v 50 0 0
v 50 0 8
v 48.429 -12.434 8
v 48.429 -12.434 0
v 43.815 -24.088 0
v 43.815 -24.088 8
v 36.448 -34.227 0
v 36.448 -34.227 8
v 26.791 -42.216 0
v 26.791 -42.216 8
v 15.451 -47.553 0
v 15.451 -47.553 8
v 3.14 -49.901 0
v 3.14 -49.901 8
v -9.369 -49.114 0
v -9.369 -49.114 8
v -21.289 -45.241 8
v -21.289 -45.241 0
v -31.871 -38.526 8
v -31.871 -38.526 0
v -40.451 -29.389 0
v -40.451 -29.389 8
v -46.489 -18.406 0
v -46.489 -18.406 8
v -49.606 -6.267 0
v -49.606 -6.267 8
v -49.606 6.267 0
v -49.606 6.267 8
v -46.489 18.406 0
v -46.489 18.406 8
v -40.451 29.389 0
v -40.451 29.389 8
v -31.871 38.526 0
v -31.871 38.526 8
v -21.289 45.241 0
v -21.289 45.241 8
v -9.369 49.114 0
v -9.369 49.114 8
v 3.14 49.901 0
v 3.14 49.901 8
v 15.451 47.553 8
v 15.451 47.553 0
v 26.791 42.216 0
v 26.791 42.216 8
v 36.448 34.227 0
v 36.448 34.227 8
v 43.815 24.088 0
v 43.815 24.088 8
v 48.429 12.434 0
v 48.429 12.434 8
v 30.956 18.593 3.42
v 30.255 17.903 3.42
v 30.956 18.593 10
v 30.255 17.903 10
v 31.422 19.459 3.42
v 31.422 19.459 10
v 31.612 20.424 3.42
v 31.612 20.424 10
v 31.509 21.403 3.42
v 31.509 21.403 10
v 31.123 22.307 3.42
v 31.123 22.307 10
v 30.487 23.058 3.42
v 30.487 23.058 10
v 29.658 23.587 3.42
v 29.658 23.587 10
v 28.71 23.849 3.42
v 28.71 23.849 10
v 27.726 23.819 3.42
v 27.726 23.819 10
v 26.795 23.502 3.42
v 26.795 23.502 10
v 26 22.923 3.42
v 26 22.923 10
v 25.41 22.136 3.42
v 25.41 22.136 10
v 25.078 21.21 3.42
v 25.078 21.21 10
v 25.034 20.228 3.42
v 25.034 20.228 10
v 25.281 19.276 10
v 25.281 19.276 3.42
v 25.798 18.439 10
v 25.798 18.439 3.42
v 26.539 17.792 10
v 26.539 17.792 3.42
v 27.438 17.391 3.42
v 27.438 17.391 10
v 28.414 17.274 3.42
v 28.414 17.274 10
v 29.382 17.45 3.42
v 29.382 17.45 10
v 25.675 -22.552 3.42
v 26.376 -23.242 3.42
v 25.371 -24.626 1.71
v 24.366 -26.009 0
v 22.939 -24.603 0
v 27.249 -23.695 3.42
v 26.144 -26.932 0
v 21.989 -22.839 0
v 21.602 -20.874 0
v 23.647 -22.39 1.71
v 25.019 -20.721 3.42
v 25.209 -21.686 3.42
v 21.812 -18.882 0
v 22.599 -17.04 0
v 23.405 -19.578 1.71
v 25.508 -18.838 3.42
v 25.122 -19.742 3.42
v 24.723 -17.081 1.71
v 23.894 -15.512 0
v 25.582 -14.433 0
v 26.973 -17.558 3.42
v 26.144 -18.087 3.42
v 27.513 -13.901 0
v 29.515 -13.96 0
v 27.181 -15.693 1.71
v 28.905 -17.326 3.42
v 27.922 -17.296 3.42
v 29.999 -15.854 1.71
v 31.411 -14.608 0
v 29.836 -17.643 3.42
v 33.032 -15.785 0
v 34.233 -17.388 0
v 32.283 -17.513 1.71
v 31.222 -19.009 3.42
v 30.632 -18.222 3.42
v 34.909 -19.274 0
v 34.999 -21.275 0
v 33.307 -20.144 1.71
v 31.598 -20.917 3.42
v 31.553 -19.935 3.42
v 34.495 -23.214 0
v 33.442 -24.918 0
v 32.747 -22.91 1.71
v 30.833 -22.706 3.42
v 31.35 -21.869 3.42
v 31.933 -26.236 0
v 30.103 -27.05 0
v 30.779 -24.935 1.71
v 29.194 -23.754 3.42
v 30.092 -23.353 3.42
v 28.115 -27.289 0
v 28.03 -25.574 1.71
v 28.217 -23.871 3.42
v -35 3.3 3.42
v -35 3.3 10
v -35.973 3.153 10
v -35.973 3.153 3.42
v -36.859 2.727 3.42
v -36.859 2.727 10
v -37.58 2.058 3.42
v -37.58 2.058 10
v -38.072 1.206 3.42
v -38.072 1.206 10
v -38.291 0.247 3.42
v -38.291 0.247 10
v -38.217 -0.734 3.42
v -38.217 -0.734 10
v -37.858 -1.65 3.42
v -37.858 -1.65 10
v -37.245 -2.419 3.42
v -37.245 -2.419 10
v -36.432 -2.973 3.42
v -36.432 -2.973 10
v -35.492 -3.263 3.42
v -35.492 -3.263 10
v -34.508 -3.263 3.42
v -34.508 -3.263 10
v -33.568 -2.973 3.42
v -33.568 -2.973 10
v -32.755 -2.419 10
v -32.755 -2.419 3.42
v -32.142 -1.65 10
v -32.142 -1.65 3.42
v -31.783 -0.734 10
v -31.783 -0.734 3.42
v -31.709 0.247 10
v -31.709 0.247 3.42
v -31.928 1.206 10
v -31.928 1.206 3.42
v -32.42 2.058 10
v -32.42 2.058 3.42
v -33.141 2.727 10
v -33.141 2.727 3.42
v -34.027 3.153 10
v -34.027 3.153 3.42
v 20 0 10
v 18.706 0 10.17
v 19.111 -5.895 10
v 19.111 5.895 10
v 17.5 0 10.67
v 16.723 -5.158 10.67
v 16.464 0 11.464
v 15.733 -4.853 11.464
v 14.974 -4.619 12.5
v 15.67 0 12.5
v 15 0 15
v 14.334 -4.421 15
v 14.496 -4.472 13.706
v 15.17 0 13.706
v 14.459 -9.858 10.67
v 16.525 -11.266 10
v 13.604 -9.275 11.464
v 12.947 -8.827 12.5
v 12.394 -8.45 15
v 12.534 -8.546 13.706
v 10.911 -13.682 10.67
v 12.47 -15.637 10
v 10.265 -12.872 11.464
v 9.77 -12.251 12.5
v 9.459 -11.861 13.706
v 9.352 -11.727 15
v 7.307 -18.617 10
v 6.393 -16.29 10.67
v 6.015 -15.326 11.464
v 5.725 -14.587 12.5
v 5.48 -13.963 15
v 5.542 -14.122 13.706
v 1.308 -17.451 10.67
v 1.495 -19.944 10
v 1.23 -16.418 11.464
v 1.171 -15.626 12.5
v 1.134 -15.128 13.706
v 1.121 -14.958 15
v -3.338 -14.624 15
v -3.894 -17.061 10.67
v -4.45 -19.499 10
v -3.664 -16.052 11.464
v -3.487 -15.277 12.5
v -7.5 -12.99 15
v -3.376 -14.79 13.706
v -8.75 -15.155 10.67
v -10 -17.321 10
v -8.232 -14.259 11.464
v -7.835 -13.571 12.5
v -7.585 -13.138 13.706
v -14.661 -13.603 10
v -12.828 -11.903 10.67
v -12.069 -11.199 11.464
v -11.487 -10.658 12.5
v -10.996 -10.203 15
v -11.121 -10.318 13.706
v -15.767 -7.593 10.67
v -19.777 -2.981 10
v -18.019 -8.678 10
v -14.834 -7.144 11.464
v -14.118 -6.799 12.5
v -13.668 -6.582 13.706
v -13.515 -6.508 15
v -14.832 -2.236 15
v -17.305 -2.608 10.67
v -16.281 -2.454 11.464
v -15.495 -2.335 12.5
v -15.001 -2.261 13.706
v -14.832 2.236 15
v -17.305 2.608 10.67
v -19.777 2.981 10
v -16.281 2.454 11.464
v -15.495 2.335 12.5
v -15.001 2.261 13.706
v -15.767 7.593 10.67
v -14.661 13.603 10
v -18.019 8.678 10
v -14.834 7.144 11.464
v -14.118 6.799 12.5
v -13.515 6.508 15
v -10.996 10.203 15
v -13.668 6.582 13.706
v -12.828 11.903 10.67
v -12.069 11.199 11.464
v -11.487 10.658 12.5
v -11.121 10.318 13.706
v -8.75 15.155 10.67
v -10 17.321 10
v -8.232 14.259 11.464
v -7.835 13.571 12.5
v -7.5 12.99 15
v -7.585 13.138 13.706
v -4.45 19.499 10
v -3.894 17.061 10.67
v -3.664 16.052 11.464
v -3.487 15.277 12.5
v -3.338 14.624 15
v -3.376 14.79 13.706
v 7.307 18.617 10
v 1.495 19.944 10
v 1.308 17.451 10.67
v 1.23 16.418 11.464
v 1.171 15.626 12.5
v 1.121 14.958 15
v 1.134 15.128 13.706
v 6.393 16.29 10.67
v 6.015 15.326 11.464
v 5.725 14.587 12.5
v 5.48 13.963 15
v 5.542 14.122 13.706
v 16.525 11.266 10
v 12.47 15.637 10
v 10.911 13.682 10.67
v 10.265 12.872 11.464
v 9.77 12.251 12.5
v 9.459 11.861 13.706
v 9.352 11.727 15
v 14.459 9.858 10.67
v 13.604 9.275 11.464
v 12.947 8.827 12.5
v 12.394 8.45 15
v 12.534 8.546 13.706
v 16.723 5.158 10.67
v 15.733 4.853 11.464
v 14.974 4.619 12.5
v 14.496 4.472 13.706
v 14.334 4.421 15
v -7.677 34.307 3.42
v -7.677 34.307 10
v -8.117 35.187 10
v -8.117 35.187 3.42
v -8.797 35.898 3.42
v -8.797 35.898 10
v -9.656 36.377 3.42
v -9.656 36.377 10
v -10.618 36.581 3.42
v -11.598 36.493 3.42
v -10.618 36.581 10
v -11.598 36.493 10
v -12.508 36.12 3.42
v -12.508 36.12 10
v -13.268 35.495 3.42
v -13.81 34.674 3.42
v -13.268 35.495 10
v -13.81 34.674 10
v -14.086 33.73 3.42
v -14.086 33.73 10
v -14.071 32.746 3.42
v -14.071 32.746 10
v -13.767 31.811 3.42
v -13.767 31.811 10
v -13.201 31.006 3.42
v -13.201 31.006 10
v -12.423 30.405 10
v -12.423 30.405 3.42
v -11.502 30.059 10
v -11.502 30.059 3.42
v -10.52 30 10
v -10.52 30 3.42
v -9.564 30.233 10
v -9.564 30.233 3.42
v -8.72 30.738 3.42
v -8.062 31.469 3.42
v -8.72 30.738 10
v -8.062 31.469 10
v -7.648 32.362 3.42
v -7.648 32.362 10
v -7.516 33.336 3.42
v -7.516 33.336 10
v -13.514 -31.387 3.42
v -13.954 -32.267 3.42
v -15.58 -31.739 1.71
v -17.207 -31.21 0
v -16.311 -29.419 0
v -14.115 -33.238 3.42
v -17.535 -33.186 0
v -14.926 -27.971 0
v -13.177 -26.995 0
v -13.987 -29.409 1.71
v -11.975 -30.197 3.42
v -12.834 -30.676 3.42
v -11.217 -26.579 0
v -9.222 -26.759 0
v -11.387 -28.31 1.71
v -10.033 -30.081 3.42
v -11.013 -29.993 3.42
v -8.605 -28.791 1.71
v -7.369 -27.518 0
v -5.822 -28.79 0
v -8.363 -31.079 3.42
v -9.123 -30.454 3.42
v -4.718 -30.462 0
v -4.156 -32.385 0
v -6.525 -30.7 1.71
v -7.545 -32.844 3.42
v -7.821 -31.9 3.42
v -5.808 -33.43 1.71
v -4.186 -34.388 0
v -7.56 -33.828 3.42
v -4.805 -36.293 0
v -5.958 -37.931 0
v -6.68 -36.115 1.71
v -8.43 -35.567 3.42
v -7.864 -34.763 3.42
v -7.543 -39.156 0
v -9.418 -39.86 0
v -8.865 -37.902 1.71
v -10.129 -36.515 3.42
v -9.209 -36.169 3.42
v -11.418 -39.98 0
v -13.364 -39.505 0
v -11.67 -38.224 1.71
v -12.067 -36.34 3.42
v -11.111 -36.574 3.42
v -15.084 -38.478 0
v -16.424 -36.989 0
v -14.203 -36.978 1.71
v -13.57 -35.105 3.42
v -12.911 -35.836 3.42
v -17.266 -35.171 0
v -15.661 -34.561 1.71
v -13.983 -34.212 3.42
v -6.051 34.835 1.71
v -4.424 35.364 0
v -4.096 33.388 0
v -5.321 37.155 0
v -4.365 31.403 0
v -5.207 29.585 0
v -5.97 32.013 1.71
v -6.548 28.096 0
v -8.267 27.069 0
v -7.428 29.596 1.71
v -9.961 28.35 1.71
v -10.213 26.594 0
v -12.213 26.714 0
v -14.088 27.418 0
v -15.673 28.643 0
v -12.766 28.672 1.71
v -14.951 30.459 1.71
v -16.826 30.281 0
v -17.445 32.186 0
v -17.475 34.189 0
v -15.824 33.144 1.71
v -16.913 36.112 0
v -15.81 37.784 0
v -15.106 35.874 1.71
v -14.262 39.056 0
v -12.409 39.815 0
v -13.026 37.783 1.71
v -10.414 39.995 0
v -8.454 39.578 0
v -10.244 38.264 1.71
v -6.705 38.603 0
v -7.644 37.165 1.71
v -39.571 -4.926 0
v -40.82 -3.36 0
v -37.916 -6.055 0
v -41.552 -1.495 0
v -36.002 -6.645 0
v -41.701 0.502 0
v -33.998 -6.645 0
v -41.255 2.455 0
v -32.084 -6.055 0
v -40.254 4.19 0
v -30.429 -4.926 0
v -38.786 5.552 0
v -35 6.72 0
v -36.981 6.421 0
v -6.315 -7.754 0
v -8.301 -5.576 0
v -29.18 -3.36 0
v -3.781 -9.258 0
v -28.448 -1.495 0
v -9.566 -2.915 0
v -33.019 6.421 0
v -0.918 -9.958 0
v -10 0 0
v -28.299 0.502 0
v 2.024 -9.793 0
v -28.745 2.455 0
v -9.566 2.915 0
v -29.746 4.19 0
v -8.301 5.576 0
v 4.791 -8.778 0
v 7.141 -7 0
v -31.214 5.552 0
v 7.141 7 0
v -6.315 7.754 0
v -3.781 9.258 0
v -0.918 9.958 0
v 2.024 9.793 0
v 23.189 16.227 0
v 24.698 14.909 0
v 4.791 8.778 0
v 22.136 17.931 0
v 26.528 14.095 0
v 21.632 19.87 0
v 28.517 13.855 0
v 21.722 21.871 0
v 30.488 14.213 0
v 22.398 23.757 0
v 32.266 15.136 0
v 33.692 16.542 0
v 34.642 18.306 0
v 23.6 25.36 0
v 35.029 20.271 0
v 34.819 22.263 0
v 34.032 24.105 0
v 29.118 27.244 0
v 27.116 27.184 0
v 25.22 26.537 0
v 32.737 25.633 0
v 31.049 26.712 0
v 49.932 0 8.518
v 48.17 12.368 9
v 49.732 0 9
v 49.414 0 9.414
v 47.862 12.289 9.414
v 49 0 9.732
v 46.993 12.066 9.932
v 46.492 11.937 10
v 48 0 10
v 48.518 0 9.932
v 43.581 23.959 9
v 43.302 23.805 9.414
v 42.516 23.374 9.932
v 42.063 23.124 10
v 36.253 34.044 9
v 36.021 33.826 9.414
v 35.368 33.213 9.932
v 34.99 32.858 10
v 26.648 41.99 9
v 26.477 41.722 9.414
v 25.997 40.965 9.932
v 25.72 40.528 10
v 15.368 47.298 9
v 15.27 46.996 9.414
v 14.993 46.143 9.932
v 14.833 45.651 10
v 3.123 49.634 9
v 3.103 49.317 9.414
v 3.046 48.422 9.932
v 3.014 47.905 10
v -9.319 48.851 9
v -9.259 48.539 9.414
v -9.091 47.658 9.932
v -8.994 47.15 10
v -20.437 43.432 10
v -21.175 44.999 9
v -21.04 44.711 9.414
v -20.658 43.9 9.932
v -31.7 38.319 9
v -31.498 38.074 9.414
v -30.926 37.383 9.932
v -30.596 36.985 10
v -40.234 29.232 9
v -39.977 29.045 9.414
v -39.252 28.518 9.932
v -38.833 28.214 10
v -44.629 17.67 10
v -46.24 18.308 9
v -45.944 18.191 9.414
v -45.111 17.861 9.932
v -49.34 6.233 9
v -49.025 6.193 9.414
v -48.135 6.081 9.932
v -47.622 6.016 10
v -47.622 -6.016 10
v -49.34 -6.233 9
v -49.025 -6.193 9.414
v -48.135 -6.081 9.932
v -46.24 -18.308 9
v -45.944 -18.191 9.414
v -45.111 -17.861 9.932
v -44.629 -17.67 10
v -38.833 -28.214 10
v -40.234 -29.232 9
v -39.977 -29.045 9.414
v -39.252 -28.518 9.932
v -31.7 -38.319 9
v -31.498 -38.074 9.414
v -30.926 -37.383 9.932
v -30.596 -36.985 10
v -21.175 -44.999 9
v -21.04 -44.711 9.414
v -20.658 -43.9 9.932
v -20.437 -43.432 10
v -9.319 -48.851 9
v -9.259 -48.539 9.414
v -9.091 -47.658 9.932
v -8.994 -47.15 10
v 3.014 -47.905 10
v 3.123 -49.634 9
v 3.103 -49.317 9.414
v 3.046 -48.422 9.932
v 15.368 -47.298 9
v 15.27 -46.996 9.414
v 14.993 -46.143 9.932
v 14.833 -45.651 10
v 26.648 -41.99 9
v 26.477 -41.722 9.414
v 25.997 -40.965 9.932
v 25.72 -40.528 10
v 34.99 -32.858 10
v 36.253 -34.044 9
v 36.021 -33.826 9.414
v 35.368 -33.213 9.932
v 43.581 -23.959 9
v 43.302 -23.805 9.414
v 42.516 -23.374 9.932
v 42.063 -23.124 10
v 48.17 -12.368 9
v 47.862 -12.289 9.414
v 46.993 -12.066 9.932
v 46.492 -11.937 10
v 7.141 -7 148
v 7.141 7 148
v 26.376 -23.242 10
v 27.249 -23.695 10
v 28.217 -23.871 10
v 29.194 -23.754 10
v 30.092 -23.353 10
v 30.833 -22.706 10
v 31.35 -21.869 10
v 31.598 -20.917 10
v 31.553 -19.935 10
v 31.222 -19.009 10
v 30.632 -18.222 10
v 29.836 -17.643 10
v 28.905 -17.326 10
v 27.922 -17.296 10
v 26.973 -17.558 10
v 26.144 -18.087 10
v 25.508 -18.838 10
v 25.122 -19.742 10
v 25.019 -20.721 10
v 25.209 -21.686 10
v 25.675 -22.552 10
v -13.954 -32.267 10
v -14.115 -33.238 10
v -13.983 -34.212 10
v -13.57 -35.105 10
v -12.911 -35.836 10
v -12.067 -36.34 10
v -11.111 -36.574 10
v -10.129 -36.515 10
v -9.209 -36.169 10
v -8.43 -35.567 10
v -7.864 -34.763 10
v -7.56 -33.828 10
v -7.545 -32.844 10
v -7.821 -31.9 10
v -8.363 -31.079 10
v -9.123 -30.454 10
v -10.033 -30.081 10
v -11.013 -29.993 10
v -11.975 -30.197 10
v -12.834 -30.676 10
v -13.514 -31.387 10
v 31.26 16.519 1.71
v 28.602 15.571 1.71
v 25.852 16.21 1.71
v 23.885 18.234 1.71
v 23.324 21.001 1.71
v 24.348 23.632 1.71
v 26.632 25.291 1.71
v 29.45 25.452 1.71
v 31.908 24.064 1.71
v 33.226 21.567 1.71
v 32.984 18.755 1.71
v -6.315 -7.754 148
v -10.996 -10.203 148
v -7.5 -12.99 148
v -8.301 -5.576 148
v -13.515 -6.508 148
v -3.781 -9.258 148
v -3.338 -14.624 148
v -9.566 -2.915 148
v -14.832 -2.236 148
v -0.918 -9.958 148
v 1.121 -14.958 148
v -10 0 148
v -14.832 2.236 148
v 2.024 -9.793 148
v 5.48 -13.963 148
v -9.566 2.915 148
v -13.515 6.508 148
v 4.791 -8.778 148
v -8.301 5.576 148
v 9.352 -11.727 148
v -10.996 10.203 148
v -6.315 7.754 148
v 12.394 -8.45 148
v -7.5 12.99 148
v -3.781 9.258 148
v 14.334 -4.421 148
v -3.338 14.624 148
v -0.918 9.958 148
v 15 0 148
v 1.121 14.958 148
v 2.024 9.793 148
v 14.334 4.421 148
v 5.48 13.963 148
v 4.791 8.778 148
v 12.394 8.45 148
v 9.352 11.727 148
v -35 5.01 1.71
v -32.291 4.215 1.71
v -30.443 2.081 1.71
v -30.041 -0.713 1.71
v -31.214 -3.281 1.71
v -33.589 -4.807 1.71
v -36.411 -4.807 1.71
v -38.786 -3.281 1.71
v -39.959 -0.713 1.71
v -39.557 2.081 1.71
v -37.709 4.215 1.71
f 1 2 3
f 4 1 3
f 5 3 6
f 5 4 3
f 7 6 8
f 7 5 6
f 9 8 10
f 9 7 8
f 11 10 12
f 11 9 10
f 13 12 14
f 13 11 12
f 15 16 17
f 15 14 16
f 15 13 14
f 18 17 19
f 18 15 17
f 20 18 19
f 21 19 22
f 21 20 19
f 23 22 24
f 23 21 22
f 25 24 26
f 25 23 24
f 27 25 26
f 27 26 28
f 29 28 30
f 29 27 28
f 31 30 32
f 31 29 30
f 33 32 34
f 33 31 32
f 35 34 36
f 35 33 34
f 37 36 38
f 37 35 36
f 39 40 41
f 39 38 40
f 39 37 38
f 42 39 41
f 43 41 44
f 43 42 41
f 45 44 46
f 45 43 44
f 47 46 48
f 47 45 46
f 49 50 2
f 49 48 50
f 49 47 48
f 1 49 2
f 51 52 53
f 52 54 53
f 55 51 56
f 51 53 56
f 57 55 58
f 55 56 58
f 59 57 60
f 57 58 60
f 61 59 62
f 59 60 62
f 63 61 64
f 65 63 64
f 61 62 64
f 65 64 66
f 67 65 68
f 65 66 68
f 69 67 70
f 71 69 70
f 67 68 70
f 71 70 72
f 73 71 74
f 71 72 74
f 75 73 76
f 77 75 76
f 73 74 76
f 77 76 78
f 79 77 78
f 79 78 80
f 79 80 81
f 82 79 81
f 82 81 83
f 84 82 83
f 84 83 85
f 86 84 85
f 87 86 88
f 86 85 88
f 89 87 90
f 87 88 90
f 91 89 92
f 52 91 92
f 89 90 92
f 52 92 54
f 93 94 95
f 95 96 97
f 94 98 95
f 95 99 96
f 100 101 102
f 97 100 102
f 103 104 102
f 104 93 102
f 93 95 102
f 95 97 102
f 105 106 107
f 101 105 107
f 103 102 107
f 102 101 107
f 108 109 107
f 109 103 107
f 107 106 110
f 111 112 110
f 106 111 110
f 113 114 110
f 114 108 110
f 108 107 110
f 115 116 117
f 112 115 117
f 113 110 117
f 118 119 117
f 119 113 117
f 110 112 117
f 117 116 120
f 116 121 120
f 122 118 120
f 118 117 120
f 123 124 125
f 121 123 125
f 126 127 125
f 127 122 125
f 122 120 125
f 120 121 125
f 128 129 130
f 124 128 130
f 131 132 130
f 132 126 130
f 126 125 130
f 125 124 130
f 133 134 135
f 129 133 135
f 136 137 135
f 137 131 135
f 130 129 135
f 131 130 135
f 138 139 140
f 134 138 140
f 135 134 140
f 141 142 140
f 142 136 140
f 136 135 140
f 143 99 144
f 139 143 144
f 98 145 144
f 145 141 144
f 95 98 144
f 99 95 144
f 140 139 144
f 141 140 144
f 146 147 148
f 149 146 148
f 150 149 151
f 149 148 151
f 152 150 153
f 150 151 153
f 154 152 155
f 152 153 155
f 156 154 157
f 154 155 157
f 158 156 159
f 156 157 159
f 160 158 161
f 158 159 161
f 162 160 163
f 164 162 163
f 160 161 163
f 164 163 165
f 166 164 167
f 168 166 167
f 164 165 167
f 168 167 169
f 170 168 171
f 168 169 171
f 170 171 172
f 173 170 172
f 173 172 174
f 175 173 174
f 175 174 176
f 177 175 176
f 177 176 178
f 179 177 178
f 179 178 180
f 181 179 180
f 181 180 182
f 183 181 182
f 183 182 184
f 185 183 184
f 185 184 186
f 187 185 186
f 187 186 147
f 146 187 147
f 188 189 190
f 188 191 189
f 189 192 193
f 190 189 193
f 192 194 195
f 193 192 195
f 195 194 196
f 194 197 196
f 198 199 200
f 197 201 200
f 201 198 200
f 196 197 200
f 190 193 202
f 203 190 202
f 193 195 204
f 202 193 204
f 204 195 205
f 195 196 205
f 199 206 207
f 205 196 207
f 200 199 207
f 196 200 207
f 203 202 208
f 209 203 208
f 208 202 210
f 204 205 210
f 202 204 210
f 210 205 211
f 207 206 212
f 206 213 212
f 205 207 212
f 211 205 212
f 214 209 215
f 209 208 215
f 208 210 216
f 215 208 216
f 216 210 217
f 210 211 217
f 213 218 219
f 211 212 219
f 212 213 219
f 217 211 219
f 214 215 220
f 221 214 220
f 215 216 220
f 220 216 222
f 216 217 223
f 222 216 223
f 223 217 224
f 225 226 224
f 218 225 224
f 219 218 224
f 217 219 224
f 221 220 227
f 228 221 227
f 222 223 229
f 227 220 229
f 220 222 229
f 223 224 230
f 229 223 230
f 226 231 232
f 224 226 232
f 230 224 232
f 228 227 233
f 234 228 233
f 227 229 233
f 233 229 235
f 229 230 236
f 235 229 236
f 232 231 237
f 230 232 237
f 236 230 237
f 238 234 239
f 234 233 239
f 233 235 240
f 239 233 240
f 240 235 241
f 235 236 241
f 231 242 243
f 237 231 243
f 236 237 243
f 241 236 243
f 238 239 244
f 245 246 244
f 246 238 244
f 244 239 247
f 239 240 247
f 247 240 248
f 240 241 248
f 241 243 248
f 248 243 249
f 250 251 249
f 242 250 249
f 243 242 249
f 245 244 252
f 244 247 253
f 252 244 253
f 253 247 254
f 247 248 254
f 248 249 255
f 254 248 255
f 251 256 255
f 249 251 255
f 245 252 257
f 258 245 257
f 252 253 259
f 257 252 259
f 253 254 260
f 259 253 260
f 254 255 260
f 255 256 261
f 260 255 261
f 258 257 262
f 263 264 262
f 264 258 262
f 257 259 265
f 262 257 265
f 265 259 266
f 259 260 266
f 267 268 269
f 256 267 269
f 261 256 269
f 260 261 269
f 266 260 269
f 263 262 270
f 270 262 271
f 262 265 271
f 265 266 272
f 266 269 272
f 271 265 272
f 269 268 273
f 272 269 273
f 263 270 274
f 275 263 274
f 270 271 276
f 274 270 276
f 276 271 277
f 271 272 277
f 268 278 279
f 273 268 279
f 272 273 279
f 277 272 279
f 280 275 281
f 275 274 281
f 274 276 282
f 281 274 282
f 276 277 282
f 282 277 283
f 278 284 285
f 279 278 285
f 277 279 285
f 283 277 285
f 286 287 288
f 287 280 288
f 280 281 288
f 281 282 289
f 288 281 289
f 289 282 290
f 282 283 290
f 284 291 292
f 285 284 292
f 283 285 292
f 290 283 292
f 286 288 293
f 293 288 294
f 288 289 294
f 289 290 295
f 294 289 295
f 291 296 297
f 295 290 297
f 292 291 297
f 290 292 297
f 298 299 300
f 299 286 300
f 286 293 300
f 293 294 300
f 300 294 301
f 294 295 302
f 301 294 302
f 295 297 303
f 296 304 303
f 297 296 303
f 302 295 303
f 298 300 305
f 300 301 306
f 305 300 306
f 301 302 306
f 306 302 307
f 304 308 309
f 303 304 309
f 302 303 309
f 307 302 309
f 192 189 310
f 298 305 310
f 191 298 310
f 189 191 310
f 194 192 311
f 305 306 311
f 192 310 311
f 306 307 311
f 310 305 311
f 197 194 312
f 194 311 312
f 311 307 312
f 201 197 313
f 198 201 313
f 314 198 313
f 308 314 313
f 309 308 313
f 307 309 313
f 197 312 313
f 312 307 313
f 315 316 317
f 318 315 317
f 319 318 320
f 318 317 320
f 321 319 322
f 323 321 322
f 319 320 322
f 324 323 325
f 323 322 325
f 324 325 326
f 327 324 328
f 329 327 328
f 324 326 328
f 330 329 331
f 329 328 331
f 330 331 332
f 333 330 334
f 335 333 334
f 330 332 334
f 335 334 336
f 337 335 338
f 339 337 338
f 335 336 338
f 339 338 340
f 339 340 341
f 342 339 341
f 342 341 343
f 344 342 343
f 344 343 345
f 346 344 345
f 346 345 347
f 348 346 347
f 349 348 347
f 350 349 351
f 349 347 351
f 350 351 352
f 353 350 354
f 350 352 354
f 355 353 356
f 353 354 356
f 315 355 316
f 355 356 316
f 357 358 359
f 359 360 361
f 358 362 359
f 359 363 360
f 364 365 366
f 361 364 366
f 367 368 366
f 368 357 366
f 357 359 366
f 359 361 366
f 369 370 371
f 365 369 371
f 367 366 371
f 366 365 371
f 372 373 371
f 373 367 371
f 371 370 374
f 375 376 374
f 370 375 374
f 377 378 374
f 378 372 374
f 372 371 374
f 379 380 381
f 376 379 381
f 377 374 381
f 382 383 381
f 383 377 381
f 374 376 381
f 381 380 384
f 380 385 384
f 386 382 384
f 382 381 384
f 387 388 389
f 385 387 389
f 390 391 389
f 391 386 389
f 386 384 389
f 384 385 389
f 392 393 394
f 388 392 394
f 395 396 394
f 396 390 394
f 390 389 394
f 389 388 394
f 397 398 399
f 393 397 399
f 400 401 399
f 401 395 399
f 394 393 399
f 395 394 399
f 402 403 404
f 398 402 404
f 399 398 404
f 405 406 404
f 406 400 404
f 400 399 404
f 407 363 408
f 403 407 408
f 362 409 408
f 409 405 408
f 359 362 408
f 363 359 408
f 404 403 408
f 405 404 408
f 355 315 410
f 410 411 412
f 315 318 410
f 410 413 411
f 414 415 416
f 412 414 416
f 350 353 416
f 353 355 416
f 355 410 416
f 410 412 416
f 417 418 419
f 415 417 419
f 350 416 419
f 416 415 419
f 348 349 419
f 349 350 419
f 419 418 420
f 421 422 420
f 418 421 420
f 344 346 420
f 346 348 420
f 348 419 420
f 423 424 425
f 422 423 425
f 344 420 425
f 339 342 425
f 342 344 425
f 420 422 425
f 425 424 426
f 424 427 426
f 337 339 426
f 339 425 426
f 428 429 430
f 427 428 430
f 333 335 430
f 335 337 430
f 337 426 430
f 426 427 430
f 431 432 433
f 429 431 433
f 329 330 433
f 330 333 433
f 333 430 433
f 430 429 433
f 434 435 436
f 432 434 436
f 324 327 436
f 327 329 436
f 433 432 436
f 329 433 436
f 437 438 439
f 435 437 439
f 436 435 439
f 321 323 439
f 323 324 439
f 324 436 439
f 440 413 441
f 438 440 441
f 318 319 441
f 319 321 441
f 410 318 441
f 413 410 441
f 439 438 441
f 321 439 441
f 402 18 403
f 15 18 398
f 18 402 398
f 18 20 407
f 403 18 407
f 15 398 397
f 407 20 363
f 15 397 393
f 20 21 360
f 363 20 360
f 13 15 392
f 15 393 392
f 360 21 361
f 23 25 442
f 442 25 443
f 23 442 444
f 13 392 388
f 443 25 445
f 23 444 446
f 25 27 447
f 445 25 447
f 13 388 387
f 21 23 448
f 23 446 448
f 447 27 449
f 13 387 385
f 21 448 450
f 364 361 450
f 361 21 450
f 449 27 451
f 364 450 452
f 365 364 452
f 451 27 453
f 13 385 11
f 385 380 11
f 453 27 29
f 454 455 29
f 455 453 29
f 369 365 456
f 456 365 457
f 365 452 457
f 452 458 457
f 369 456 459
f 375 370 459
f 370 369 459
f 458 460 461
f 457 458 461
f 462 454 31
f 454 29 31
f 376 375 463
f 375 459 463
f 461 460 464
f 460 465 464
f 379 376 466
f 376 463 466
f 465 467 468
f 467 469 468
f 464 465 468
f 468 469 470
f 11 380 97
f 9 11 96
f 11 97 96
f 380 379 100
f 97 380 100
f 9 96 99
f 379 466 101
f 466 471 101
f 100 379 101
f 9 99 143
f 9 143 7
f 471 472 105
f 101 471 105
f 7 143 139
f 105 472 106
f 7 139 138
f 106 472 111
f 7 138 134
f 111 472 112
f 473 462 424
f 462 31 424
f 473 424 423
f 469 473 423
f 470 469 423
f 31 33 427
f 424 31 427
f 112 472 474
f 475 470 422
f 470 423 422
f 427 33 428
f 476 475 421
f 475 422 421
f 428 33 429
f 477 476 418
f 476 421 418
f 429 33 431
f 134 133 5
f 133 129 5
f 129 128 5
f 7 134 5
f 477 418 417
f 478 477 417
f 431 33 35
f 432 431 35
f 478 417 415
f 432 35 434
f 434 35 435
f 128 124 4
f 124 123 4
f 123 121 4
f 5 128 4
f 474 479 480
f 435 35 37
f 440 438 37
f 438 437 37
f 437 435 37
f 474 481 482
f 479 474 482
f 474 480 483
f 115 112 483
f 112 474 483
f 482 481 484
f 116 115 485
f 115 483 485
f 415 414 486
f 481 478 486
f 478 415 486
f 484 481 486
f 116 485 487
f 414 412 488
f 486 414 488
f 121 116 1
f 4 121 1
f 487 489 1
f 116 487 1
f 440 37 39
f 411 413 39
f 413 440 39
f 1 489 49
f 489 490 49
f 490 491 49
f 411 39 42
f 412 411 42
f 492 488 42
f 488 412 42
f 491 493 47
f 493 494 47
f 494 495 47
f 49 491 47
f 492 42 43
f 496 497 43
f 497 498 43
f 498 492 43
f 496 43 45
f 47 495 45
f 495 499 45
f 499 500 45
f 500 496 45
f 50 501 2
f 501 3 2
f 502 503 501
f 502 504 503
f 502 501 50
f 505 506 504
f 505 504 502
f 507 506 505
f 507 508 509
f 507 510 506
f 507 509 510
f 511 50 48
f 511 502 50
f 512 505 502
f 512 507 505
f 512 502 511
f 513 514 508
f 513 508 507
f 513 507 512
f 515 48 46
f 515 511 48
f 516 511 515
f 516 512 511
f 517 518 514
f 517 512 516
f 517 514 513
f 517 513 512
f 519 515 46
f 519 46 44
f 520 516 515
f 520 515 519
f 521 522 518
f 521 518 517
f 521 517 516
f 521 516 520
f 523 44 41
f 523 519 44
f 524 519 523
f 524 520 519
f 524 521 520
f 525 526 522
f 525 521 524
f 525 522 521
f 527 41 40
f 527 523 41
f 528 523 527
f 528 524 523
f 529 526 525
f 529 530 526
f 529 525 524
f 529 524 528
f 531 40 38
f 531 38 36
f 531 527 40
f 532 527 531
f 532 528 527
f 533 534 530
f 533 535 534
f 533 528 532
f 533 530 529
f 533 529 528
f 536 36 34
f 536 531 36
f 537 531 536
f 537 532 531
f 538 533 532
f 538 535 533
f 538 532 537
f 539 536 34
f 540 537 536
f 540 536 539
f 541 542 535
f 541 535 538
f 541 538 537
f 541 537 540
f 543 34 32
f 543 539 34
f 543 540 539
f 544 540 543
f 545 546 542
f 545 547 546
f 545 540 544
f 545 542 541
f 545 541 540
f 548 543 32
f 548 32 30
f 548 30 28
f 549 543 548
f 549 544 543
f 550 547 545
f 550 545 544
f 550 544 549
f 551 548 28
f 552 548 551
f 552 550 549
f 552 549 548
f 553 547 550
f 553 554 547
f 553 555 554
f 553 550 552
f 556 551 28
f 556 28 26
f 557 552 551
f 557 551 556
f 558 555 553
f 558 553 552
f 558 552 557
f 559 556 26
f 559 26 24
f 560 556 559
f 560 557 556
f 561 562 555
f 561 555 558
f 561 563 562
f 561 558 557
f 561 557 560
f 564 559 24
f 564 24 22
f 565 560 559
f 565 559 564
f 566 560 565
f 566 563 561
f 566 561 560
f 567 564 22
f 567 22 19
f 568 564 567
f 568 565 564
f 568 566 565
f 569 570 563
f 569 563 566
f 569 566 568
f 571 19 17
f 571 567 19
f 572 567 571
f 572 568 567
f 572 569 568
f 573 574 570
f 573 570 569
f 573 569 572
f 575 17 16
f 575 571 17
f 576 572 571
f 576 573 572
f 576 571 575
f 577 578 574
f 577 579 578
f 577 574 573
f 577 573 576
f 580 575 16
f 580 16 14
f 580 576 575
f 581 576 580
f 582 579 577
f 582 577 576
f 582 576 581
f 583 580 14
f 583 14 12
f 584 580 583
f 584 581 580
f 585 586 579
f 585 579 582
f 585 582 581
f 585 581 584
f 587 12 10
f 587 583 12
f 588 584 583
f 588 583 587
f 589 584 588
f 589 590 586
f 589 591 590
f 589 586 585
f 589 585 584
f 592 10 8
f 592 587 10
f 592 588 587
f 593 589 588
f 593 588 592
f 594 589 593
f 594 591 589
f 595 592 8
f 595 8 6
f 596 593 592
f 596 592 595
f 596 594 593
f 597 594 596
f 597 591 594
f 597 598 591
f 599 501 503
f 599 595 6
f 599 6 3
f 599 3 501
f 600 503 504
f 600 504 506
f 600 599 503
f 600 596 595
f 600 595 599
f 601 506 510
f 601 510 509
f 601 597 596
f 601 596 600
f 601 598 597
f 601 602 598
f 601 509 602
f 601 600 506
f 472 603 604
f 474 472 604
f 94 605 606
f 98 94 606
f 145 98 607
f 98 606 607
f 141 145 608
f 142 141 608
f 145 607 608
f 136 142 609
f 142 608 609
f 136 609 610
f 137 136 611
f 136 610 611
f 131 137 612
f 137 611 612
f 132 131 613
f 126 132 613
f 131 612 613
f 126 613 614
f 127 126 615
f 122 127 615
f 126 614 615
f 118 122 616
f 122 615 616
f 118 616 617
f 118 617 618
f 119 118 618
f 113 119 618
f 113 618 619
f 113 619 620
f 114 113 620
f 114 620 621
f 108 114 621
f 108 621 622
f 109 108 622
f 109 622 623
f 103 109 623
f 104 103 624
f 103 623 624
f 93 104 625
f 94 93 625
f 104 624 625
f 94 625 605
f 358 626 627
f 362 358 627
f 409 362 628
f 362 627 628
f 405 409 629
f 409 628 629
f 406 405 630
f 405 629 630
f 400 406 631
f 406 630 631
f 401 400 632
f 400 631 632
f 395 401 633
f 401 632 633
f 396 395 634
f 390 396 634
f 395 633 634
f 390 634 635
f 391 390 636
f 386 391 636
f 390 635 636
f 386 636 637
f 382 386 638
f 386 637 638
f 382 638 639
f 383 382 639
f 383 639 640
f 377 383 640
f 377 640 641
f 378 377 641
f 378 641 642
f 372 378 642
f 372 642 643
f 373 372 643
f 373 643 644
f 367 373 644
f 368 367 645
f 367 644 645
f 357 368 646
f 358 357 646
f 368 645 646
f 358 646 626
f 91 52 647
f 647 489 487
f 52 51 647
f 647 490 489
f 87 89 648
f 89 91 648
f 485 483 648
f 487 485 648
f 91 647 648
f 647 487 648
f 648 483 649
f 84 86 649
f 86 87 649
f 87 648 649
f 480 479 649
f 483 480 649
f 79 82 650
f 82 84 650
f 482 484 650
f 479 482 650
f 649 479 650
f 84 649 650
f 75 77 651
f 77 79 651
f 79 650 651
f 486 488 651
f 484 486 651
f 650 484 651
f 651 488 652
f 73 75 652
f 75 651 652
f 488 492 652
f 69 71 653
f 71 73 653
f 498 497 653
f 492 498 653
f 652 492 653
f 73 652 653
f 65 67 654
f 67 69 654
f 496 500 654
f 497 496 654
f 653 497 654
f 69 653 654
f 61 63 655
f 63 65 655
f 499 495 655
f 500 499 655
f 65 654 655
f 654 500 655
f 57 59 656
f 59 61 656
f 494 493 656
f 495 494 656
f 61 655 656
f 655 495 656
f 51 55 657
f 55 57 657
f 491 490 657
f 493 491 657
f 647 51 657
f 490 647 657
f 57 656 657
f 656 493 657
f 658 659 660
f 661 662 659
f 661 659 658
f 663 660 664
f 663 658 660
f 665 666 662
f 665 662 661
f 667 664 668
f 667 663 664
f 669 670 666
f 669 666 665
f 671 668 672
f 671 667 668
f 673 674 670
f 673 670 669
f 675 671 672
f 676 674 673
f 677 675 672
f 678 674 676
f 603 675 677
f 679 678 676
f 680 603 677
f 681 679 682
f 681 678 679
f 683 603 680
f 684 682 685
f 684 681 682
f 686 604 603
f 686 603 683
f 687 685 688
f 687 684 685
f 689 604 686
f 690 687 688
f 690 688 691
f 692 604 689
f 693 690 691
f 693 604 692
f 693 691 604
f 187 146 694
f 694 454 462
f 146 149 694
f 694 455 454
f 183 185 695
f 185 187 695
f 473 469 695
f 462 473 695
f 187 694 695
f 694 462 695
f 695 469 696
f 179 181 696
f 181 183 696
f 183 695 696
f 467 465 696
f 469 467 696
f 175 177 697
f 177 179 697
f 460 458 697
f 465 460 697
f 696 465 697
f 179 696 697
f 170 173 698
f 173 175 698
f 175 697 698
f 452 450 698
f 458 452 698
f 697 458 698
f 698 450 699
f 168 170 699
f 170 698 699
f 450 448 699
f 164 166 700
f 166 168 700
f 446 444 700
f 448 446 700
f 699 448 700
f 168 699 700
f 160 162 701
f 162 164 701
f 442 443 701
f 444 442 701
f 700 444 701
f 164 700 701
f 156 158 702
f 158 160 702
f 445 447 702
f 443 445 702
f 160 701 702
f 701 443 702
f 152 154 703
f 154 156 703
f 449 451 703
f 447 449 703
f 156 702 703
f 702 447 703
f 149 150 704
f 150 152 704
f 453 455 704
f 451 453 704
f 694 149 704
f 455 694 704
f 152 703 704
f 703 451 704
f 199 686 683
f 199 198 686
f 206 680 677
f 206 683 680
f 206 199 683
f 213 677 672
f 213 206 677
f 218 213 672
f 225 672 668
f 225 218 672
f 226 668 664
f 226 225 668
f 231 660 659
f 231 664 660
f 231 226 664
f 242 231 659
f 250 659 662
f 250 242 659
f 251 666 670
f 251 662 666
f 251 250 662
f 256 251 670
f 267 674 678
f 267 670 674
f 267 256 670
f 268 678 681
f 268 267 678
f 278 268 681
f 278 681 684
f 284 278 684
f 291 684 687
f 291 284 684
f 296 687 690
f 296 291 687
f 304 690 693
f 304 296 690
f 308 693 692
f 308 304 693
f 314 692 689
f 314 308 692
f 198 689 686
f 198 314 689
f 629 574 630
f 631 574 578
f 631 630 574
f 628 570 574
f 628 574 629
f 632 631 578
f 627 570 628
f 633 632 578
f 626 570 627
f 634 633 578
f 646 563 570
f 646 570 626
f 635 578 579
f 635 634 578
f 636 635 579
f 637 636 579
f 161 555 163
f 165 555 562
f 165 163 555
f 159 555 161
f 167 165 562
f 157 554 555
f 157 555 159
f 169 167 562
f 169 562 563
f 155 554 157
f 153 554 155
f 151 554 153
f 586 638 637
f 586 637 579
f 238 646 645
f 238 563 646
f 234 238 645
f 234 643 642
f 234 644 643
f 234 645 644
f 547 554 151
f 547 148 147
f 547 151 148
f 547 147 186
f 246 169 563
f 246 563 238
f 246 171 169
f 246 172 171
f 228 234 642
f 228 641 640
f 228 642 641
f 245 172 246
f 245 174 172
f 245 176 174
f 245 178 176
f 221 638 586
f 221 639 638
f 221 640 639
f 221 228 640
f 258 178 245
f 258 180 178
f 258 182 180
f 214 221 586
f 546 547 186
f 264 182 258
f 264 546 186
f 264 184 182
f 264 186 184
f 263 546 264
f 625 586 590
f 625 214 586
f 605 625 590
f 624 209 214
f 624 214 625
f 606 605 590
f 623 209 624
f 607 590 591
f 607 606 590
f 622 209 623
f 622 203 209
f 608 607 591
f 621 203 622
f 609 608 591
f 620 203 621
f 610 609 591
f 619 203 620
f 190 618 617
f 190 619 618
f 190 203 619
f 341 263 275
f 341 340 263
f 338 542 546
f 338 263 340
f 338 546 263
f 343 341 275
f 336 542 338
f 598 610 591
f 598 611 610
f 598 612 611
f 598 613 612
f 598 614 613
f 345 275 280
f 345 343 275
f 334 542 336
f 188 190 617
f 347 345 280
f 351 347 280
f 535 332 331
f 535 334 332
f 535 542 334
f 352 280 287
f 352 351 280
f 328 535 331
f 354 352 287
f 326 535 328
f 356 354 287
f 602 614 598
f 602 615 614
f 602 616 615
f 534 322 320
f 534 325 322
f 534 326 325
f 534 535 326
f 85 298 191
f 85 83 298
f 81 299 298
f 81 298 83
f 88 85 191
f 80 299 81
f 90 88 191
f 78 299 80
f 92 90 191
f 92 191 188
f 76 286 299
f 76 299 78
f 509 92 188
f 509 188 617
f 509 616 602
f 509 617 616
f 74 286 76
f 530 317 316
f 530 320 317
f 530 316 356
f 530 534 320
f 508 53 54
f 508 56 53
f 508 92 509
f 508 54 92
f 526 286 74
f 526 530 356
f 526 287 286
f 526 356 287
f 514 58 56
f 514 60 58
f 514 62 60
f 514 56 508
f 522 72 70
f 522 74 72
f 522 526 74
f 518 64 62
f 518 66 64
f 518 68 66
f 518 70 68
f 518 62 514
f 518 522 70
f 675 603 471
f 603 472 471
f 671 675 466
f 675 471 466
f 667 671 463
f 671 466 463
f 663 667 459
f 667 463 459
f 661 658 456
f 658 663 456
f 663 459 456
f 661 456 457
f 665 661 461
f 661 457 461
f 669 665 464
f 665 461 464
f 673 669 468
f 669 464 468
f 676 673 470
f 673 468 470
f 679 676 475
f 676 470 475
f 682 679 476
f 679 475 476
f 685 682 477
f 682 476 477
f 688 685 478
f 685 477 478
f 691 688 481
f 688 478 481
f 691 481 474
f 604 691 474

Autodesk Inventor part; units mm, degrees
ref_plane "YZ Plane" through (0, 0, 0) normal (1, 0, 0) x (0, 1, 0)
ref_plane "XZ Plane" through (0, 0, 0) normal (0, 1, 0) x (-1, 0, 0)
ref_plane "XY Plane" through (0, 0, 0) normal (0, 0, 1) x (1, 0, 0)
sketch "Sketch2" plane through (0, 0, 0) normal (0, 0, 1) x (1, 0, 0)
  circle A0 centre (0, 0) radius 50
  arc A1 (7.1414, 7) -> (7.1414, -7) centre (0, 0) ccw
  line L0 (7.1414, -7) -> (7.1414, 7)
  dimension "d2" = 100
  dimension "d3" = 20
  dimension "d23" = 14
extrude "Extrusion1" add sketch "Sketch2" along normal blind 10
sketch "Sketch3" plane through (0, 0, 10) normal (0, 0, 1) x (1, 0, 0)
  circle A0 centre (0, 0) radius 15
  line L0 (7.1414, 7) -> (7.1414, -7) projected
  arc A1 (7.1414, 7) -> (7.1414, -7) centre (0, 0) ccw projected
  circle A2 centre (0, 0) radius 50 projected
  dimension "d6" = 30
extrude "Extrusion2" add sketch "Sketch3" along normal blind 138 contours A0
fillet "Fillet1" radius 2 1 edges at (-50, 0, 10)
fillet "Fillet2" radius 5 1 edges at (-15, 0, 10)
sketch "Sketch4" plane through (0, 0, 0) normal (0, 0, -1) x (-1, 0, 0)
  circle A0 centre (35, 0) radius 6
  point P0 (0, 0)
  dimension "d11" = 35
  dimension "d12" = 12
hole "Hole1" at (-35, 0, 0) direction (0, 0, 1) diameter 6.6 end through all countersink diameter 13.44 countersink angle 90
pattern_circular "Circular Pattern1" count 5 over 360 about axis through (0, 0, 0) along (0, 0, 1) of "Hole1"
properties part number "342-01" material "Titanium"
